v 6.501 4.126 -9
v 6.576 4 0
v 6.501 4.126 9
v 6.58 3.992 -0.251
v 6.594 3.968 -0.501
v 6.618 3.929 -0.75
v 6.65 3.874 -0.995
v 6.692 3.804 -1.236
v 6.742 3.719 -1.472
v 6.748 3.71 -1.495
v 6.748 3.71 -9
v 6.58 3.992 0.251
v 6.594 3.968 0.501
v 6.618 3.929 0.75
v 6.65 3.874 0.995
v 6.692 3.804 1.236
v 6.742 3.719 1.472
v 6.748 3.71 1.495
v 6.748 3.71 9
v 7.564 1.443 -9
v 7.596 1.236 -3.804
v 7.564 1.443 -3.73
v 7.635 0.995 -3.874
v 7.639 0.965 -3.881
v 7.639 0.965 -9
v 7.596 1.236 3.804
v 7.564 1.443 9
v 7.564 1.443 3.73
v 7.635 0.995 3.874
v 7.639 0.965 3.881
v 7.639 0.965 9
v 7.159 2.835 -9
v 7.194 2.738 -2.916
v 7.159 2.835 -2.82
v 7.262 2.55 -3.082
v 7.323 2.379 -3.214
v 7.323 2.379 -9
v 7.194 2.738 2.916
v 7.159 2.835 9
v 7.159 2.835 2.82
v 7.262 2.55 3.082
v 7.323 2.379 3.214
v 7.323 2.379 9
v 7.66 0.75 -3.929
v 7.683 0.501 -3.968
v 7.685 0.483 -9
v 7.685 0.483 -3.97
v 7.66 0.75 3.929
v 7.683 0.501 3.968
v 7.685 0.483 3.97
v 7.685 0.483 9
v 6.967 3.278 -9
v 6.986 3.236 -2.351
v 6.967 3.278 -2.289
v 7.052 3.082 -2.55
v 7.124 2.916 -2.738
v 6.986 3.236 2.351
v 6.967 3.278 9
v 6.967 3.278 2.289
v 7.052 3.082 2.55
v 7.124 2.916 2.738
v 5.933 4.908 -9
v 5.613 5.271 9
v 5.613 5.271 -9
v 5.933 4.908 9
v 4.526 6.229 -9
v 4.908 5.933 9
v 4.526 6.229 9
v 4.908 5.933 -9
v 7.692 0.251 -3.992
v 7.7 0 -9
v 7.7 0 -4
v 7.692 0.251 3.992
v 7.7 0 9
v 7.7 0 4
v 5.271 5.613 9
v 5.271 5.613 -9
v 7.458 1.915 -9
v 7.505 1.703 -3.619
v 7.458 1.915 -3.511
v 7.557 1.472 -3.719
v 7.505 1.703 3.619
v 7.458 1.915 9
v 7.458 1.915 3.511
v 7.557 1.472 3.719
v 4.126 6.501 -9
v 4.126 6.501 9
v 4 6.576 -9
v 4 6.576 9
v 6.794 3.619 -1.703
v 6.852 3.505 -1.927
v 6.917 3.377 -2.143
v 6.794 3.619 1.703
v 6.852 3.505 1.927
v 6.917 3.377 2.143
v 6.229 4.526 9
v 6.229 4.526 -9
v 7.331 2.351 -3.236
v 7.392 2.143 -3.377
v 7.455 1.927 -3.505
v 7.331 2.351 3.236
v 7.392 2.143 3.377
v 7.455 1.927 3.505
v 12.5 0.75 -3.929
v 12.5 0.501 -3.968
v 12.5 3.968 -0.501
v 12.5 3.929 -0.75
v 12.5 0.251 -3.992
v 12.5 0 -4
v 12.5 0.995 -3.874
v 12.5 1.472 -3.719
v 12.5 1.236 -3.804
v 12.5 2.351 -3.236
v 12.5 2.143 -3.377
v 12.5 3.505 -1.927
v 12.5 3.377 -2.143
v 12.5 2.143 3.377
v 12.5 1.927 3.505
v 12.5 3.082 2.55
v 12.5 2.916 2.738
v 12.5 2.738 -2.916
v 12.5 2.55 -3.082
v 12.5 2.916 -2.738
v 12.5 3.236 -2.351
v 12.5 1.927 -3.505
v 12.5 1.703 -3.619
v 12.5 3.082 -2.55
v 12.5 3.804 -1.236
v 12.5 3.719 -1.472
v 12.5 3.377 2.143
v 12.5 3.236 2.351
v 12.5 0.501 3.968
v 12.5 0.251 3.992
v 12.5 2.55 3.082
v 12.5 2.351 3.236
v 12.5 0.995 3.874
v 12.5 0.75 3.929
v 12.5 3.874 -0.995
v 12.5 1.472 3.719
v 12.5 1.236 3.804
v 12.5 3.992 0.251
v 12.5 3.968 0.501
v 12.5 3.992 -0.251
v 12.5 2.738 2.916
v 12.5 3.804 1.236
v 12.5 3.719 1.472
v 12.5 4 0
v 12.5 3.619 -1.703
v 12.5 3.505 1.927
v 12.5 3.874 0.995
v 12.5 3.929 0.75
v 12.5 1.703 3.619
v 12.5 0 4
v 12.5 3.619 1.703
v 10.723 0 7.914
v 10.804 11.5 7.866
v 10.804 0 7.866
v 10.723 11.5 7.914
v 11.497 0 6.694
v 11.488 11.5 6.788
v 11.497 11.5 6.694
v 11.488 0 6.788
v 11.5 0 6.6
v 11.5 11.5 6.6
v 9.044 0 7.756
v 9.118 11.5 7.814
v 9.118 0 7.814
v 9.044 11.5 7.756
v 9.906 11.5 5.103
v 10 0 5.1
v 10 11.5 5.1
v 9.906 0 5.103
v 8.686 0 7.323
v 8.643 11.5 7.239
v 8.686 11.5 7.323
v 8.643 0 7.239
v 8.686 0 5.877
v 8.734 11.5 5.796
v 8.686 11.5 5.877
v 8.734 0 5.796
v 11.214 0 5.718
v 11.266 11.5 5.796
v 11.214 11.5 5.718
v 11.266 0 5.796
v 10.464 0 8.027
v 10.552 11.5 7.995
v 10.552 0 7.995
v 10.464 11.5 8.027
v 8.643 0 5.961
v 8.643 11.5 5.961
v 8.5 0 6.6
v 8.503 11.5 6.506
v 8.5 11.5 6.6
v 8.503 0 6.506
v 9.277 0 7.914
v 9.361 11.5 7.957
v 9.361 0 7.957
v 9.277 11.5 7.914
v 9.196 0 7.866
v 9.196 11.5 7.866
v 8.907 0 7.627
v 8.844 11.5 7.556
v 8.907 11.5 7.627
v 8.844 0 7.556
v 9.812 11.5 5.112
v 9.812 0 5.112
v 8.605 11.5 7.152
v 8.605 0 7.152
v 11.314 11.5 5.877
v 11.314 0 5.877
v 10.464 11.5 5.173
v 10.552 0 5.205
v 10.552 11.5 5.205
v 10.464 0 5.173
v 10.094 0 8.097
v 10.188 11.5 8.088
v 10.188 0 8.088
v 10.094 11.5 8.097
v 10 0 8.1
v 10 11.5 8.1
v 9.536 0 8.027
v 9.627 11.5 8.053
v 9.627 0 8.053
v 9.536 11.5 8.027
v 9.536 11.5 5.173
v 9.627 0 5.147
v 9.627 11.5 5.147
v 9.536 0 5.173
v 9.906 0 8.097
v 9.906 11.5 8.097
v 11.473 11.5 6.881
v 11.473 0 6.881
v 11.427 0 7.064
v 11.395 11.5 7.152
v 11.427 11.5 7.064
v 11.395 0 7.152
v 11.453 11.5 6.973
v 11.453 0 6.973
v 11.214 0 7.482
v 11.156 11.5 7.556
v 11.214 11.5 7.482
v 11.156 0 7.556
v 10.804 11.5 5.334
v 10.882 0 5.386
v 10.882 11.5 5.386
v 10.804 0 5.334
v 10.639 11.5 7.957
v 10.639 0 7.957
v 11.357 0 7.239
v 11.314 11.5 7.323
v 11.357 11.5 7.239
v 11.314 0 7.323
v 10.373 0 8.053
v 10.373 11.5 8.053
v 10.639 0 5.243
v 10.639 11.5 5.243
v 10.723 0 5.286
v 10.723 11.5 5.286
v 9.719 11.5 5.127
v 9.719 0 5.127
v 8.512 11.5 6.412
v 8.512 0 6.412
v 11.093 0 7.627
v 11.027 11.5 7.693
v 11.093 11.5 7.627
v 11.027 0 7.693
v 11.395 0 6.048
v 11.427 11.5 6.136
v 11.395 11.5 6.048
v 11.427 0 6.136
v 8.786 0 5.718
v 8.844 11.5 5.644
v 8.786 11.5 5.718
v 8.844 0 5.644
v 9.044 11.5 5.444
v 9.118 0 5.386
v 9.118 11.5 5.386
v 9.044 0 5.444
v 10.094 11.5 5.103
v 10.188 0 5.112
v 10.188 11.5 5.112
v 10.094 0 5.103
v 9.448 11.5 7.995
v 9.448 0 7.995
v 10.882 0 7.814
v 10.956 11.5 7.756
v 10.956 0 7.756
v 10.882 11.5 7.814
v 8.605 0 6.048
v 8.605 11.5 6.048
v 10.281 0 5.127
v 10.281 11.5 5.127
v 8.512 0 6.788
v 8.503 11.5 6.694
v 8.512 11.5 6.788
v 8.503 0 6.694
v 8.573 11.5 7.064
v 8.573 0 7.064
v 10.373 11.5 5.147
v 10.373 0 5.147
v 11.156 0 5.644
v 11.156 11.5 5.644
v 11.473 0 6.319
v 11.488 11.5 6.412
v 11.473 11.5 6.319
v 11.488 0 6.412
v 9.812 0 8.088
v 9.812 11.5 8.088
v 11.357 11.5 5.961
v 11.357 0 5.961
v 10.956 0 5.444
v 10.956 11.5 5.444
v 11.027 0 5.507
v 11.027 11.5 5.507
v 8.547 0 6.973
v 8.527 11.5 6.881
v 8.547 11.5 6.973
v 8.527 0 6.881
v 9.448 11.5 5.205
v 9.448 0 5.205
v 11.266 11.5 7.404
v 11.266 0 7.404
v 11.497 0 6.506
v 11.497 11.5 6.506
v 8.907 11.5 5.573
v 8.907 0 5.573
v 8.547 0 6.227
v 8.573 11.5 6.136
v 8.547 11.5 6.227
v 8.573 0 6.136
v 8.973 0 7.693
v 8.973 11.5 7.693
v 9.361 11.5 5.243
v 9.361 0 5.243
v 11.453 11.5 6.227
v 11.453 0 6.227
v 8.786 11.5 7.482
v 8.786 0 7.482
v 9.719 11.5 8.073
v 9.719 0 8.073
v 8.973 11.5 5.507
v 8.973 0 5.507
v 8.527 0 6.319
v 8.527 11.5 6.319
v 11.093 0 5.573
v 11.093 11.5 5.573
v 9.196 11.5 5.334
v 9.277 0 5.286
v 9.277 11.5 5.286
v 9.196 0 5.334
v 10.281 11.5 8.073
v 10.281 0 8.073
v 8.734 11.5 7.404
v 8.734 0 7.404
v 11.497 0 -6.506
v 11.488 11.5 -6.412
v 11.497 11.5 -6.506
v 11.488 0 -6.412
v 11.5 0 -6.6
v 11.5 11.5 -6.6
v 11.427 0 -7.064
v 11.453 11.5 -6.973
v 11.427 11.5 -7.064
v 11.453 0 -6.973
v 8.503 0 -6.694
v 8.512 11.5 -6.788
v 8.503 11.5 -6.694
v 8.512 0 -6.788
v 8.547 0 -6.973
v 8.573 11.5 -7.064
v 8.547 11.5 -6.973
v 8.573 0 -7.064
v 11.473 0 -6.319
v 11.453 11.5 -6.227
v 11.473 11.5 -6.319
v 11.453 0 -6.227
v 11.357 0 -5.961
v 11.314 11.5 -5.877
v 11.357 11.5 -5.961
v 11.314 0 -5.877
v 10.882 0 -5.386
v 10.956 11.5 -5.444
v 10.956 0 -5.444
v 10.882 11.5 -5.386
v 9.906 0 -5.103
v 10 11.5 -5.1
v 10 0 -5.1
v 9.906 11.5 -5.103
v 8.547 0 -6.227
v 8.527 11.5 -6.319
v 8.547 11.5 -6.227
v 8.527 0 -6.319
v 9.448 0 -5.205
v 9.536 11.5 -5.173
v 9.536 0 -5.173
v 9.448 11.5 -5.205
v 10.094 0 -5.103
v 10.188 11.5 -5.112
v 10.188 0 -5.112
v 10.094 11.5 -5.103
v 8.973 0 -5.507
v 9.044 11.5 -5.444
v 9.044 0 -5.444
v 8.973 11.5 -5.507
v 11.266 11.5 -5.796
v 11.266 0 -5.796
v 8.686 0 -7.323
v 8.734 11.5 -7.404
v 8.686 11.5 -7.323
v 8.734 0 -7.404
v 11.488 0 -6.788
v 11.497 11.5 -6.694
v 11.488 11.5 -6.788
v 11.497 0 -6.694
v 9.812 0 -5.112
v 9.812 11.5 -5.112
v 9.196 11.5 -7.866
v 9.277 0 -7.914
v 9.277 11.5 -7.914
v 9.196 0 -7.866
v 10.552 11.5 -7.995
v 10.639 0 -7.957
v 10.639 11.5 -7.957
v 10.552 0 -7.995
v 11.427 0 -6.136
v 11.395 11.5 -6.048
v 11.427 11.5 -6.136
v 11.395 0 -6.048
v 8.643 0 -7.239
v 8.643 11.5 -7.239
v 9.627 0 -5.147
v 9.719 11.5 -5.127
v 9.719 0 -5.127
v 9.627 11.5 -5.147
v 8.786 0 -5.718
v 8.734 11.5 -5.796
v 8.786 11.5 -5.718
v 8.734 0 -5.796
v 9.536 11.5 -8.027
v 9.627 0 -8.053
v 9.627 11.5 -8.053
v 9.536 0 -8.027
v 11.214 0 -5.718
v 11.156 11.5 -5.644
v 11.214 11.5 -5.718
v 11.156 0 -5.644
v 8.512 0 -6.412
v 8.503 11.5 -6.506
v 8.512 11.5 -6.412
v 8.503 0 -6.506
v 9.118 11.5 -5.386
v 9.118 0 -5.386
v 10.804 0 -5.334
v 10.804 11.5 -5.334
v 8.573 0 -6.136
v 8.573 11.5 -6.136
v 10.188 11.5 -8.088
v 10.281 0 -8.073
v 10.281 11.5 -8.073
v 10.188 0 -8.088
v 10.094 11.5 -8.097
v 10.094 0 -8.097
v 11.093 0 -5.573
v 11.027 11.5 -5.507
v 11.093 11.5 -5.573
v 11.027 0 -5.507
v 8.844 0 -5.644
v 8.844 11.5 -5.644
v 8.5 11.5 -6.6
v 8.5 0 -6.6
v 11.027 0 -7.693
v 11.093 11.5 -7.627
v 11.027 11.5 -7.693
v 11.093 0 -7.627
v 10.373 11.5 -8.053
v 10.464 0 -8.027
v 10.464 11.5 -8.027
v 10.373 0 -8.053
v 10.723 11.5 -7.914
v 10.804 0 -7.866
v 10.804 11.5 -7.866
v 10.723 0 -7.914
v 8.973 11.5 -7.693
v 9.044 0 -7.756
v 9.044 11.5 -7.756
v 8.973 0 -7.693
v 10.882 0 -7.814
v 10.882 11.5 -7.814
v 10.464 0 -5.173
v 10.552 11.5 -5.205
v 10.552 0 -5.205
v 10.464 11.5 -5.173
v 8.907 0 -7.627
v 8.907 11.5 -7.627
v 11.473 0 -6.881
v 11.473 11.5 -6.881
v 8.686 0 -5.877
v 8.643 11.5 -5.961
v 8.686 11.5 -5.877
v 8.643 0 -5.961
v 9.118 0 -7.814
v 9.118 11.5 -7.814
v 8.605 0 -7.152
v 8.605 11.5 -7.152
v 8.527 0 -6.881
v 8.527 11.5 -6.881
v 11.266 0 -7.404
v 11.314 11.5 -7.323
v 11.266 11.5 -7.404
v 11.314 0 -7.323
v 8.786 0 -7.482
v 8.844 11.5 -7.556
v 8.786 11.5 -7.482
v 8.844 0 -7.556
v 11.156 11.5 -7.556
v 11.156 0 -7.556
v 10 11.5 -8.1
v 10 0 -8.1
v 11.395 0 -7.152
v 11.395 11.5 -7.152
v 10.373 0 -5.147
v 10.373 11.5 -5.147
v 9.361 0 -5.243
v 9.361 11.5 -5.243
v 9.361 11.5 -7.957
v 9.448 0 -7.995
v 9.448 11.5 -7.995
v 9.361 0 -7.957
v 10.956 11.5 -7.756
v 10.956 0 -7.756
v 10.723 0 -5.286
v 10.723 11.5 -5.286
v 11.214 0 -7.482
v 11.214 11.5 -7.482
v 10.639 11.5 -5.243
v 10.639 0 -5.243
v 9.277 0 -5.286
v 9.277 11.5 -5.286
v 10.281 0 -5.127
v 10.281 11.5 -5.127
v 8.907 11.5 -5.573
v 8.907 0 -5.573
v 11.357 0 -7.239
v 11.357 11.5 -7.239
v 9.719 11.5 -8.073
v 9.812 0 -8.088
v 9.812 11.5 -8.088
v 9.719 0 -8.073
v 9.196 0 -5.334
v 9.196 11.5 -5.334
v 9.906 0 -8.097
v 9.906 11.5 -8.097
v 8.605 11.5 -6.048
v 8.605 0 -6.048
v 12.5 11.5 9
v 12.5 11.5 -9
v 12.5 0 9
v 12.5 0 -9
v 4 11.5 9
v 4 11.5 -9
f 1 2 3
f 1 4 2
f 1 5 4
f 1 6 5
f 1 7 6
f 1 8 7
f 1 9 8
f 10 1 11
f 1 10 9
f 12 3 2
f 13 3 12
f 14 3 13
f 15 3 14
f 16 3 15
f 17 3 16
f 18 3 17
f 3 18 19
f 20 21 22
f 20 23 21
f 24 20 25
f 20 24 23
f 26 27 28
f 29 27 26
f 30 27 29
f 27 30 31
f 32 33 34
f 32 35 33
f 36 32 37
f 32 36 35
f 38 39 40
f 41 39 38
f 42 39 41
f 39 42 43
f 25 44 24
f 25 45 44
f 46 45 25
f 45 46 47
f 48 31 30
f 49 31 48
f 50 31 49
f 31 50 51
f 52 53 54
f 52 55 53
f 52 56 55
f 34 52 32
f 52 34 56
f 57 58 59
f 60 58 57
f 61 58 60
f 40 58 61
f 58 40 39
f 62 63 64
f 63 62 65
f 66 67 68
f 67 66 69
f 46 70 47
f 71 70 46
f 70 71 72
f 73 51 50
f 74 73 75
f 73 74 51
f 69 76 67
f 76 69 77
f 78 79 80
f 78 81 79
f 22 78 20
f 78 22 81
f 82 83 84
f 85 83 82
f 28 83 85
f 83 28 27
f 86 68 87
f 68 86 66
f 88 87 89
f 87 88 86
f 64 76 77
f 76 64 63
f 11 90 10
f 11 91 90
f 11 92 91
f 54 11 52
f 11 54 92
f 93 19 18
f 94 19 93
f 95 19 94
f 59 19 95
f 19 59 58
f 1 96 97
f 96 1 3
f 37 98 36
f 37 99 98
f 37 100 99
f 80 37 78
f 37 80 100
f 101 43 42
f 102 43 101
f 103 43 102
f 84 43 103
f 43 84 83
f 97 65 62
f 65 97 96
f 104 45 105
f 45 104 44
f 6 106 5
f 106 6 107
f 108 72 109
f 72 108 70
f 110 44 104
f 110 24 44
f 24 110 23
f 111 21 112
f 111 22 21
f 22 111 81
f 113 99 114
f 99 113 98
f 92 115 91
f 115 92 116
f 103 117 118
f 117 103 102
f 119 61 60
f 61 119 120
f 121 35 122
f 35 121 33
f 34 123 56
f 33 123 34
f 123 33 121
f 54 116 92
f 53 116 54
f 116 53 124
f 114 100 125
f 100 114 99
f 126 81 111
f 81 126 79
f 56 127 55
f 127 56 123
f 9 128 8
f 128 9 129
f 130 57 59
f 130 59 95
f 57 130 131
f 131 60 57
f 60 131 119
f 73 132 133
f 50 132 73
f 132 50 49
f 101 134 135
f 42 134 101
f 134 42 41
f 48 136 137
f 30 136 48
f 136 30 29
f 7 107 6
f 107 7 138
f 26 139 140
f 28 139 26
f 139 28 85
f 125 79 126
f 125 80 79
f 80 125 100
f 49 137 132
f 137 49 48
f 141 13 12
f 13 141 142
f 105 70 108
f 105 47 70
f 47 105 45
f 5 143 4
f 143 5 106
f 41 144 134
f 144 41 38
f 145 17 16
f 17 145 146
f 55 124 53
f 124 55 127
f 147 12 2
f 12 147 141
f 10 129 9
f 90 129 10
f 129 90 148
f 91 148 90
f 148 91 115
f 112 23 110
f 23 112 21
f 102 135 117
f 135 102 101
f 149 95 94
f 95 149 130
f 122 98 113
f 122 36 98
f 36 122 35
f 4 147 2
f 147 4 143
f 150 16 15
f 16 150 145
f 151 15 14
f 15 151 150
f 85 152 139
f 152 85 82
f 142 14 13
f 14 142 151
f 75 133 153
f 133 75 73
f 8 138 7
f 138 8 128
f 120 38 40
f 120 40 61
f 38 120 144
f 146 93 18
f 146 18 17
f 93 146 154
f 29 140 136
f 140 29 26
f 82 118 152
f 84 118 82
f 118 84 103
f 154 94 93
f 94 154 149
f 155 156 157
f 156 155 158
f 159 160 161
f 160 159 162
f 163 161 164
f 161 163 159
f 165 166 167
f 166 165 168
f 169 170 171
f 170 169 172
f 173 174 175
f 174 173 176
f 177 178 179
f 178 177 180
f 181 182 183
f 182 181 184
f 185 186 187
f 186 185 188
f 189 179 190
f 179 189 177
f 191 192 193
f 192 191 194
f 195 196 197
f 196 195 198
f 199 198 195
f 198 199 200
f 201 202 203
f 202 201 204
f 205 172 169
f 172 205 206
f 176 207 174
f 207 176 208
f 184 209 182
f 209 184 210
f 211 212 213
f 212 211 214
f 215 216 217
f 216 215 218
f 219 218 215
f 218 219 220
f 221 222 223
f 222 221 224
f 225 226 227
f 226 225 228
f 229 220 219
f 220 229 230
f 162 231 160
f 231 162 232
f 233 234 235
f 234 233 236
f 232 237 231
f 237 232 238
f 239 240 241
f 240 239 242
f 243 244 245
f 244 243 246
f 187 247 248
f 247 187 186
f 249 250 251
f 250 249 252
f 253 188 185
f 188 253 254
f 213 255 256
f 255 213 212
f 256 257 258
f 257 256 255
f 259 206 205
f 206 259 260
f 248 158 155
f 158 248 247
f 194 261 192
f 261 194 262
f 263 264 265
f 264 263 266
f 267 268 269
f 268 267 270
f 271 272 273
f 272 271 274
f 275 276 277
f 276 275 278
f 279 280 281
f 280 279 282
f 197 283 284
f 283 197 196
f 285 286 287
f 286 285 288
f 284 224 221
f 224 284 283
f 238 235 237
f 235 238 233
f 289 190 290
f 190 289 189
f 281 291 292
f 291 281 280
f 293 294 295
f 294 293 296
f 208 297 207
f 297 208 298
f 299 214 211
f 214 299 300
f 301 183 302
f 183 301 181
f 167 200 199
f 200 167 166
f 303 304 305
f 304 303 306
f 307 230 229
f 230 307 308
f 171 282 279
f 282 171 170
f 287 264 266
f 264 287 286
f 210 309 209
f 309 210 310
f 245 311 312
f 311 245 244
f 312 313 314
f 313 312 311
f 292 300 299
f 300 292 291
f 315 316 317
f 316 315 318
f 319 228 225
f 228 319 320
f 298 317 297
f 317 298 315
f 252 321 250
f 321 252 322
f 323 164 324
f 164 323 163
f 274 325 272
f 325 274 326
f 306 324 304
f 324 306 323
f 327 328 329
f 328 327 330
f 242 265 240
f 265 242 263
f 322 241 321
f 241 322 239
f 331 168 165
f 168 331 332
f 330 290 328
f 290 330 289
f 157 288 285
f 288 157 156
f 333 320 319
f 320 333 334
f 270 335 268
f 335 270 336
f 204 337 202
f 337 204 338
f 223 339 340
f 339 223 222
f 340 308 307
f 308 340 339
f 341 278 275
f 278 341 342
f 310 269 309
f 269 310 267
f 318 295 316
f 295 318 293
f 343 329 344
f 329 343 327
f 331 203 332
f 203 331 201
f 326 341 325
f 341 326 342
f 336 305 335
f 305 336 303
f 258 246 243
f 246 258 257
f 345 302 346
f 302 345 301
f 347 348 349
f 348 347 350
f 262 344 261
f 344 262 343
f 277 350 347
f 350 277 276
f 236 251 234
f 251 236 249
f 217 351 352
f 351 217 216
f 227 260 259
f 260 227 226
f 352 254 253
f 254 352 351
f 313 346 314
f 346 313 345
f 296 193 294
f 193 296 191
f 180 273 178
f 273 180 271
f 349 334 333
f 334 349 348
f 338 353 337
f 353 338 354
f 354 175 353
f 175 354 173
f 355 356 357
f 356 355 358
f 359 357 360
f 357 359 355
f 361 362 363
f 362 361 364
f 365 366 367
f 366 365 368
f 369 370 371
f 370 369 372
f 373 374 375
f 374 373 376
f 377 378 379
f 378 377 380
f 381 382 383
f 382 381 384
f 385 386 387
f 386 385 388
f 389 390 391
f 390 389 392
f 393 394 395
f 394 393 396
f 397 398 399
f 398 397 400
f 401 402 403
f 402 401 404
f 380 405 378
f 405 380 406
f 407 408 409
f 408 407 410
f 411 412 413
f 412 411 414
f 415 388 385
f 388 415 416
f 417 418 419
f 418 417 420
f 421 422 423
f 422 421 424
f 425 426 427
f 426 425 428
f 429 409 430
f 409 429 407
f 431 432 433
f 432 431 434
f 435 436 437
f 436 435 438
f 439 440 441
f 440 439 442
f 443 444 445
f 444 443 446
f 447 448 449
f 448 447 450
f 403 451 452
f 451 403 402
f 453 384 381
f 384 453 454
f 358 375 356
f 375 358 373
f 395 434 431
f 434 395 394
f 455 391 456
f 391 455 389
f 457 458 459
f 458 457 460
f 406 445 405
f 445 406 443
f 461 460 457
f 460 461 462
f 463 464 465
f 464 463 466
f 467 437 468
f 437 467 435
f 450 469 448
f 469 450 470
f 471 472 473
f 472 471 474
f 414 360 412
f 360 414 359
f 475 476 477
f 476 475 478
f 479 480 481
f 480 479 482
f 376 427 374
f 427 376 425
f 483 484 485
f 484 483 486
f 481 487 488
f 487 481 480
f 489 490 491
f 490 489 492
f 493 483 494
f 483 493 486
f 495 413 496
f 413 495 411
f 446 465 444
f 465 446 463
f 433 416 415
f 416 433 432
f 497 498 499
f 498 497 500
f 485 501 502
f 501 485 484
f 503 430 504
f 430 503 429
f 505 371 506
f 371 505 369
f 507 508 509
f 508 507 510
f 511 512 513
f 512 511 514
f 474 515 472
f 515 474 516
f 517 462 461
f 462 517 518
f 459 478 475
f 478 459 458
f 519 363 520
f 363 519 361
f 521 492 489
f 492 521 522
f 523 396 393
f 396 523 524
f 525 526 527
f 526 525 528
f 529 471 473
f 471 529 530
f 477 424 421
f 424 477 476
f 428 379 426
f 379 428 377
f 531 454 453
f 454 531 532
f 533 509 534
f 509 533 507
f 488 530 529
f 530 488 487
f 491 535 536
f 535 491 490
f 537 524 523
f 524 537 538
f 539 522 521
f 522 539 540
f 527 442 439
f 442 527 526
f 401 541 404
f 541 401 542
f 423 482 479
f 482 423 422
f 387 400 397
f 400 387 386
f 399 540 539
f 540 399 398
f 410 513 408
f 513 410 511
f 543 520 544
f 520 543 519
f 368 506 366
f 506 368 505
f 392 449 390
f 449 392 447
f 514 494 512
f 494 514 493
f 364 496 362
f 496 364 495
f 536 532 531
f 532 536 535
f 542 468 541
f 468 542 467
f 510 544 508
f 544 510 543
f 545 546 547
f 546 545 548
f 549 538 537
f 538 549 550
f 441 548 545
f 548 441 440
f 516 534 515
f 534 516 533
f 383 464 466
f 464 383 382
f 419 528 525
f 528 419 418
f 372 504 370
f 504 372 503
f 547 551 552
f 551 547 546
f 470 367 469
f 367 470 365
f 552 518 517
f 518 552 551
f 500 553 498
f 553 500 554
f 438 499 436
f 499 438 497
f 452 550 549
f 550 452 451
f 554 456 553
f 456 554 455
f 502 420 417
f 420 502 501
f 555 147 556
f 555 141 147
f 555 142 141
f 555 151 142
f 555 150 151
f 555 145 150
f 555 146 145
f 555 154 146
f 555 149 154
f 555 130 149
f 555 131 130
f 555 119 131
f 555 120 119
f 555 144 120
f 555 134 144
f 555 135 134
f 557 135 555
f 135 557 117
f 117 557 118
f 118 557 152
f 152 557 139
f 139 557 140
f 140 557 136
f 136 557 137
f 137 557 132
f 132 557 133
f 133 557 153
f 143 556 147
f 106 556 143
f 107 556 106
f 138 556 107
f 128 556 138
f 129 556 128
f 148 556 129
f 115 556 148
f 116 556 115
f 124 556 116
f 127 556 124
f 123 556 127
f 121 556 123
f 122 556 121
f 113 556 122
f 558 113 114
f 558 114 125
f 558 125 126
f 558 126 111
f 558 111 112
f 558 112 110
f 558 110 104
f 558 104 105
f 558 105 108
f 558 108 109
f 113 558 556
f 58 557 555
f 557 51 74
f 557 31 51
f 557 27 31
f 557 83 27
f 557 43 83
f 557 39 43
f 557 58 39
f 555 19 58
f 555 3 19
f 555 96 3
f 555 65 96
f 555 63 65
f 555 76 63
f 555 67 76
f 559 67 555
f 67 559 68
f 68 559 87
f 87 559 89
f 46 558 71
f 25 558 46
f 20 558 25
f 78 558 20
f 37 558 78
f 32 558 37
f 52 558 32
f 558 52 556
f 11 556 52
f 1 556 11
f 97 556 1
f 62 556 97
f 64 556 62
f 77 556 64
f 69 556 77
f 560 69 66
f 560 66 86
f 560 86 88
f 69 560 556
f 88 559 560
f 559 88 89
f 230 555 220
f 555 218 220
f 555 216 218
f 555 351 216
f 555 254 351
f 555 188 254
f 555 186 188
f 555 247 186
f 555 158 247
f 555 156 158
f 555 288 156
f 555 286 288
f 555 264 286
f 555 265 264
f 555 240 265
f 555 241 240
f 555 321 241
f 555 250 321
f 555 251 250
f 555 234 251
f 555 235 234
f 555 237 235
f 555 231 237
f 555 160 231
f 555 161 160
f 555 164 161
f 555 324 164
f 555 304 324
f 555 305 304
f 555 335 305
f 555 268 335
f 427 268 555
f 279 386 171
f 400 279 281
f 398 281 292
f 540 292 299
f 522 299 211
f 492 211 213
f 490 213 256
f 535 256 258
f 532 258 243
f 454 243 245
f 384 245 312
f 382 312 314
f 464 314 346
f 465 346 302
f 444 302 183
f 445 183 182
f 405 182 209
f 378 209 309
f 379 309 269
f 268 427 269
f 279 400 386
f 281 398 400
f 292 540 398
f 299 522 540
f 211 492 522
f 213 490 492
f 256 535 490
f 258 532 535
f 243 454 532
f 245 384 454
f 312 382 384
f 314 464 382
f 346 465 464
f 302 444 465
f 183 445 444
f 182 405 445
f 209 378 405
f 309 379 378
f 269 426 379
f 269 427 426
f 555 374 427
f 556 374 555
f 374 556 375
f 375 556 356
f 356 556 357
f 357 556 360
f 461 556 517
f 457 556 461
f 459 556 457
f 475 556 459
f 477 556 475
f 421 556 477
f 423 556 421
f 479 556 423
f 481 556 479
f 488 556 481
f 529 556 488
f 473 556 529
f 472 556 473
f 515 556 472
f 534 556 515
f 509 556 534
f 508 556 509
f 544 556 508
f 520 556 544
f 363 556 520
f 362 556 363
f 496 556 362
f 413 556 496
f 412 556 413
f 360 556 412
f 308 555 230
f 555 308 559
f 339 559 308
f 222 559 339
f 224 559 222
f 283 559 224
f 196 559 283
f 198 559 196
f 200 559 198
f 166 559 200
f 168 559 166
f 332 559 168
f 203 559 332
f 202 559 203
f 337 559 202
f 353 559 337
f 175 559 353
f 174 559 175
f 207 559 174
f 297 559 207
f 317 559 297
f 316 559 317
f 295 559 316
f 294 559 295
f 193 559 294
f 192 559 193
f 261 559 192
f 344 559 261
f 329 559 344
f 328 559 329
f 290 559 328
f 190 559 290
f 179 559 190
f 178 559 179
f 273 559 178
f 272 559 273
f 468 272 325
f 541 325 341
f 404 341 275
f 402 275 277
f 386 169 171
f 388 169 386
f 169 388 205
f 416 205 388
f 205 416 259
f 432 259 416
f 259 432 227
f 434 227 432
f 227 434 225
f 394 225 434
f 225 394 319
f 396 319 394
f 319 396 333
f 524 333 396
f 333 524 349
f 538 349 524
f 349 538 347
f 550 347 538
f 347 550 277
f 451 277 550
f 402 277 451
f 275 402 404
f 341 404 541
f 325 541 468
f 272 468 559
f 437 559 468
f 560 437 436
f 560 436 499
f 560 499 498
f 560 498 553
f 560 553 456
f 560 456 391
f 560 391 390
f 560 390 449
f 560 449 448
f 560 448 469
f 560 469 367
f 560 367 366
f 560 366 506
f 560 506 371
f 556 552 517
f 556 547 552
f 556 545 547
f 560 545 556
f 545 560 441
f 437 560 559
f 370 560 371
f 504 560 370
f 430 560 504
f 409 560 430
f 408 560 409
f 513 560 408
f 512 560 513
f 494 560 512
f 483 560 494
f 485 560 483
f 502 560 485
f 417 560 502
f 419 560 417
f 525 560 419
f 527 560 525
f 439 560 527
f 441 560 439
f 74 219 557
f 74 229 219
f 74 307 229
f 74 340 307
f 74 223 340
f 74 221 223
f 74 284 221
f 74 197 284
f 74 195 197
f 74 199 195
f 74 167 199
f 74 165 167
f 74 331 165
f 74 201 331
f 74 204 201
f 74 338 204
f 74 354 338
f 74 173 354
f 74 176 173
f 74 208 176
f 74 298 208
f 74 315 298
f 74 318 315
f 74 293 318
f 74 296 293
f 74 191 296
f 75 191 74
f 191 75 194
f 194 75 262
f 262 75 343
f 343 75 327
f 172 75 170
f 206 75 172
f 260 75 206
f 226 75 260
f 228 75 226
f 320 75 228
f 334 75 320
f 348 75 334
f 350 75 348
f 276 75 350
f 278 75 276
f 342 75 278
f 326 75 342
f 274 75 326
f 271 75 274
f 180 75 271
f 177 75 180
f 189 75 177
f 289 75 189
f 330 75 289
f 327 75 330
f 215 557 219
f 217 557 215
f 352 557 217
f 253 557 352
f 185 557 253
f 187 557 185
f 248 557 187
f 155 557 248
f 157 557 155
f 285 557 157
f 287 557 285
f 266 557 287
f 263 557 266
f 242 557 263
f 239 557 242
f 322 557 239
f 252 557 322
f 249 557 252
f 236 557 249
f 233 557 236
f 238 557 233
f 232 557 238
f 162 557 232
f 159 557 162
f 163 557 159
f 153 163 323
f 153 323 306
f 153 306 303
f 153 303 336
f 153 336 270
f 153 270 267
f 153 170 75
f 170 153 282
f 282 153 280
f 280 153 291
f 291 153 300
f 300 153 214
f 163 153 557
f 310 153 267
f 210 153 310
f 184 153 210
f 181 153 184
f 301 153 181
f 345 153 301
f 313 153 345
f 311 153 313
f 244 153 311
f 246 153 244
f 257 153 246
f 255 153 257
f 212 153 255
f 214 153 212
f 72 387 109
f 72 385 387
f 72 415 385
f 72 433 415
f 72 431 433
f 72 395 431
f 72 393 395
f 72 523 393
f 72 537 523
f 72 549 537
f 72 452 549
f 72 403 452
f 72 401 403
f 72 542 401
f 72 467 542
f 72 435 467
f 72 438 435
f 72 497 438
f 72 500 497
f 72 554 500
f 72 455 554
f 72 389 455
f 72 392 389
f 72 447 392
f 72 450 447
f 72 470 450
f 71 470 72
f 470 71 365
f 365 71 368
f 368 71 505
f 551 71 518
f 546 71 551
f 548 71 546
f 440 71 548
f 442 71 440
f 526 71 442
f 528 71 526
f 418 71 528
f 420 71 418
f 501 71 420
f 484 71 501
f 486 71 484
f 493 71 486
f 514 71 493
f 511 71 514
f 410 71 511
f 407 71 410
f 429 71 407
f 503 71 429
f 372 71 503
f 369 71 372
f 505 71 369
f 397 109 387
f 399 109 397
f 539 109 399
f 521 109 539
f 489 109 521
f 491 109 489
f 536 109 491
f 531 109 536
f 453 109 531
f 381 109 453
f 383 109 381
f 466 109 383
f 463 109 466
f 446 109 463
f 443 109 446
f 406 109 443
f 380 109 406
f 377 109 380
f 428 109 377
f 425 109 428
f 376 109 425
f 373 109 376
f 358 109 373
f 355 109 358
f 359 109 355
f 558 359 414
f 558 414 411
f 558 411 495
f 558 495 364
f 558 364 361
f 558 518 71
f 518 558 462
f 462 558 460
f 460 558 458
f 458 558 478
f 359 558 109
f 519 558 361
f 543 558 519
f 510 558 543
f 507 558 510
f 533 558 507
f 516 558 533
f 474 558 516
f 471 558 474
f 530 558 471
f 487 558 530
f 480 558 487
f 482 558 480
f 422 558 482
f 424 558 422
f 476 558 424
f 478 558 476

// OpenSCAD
difference(){
	union(){
        translate([4,0,-9]){
           cube([12.5-4,11.5,18], center=false);
        }        


	}
	union() {
        translate([0,0,-10]){
            rotate([0,0,90]){
                color("green")
                cylinder(h=20, r=7.7, $fn=100, center=false);
            }
        }
        translate([0,0,0]){
            rotate([0,90,0]){
                color("red")
                cylinder(h=200, r=4, $fn=100, center=false);
            }
        }

        translate([10,20,6.6]){
            rotate([90,0,0]){
                color("blue")
                cylinder(h=100, r=1.5, $fn=100, center=false);
            }
        }
        translate([10,20,-6.6]){
            rotate([90,0,0]){
                color("blue")
                cylinder(h=100, r=1.5, $fn=100, center=false);
            }
        }
	}
}
